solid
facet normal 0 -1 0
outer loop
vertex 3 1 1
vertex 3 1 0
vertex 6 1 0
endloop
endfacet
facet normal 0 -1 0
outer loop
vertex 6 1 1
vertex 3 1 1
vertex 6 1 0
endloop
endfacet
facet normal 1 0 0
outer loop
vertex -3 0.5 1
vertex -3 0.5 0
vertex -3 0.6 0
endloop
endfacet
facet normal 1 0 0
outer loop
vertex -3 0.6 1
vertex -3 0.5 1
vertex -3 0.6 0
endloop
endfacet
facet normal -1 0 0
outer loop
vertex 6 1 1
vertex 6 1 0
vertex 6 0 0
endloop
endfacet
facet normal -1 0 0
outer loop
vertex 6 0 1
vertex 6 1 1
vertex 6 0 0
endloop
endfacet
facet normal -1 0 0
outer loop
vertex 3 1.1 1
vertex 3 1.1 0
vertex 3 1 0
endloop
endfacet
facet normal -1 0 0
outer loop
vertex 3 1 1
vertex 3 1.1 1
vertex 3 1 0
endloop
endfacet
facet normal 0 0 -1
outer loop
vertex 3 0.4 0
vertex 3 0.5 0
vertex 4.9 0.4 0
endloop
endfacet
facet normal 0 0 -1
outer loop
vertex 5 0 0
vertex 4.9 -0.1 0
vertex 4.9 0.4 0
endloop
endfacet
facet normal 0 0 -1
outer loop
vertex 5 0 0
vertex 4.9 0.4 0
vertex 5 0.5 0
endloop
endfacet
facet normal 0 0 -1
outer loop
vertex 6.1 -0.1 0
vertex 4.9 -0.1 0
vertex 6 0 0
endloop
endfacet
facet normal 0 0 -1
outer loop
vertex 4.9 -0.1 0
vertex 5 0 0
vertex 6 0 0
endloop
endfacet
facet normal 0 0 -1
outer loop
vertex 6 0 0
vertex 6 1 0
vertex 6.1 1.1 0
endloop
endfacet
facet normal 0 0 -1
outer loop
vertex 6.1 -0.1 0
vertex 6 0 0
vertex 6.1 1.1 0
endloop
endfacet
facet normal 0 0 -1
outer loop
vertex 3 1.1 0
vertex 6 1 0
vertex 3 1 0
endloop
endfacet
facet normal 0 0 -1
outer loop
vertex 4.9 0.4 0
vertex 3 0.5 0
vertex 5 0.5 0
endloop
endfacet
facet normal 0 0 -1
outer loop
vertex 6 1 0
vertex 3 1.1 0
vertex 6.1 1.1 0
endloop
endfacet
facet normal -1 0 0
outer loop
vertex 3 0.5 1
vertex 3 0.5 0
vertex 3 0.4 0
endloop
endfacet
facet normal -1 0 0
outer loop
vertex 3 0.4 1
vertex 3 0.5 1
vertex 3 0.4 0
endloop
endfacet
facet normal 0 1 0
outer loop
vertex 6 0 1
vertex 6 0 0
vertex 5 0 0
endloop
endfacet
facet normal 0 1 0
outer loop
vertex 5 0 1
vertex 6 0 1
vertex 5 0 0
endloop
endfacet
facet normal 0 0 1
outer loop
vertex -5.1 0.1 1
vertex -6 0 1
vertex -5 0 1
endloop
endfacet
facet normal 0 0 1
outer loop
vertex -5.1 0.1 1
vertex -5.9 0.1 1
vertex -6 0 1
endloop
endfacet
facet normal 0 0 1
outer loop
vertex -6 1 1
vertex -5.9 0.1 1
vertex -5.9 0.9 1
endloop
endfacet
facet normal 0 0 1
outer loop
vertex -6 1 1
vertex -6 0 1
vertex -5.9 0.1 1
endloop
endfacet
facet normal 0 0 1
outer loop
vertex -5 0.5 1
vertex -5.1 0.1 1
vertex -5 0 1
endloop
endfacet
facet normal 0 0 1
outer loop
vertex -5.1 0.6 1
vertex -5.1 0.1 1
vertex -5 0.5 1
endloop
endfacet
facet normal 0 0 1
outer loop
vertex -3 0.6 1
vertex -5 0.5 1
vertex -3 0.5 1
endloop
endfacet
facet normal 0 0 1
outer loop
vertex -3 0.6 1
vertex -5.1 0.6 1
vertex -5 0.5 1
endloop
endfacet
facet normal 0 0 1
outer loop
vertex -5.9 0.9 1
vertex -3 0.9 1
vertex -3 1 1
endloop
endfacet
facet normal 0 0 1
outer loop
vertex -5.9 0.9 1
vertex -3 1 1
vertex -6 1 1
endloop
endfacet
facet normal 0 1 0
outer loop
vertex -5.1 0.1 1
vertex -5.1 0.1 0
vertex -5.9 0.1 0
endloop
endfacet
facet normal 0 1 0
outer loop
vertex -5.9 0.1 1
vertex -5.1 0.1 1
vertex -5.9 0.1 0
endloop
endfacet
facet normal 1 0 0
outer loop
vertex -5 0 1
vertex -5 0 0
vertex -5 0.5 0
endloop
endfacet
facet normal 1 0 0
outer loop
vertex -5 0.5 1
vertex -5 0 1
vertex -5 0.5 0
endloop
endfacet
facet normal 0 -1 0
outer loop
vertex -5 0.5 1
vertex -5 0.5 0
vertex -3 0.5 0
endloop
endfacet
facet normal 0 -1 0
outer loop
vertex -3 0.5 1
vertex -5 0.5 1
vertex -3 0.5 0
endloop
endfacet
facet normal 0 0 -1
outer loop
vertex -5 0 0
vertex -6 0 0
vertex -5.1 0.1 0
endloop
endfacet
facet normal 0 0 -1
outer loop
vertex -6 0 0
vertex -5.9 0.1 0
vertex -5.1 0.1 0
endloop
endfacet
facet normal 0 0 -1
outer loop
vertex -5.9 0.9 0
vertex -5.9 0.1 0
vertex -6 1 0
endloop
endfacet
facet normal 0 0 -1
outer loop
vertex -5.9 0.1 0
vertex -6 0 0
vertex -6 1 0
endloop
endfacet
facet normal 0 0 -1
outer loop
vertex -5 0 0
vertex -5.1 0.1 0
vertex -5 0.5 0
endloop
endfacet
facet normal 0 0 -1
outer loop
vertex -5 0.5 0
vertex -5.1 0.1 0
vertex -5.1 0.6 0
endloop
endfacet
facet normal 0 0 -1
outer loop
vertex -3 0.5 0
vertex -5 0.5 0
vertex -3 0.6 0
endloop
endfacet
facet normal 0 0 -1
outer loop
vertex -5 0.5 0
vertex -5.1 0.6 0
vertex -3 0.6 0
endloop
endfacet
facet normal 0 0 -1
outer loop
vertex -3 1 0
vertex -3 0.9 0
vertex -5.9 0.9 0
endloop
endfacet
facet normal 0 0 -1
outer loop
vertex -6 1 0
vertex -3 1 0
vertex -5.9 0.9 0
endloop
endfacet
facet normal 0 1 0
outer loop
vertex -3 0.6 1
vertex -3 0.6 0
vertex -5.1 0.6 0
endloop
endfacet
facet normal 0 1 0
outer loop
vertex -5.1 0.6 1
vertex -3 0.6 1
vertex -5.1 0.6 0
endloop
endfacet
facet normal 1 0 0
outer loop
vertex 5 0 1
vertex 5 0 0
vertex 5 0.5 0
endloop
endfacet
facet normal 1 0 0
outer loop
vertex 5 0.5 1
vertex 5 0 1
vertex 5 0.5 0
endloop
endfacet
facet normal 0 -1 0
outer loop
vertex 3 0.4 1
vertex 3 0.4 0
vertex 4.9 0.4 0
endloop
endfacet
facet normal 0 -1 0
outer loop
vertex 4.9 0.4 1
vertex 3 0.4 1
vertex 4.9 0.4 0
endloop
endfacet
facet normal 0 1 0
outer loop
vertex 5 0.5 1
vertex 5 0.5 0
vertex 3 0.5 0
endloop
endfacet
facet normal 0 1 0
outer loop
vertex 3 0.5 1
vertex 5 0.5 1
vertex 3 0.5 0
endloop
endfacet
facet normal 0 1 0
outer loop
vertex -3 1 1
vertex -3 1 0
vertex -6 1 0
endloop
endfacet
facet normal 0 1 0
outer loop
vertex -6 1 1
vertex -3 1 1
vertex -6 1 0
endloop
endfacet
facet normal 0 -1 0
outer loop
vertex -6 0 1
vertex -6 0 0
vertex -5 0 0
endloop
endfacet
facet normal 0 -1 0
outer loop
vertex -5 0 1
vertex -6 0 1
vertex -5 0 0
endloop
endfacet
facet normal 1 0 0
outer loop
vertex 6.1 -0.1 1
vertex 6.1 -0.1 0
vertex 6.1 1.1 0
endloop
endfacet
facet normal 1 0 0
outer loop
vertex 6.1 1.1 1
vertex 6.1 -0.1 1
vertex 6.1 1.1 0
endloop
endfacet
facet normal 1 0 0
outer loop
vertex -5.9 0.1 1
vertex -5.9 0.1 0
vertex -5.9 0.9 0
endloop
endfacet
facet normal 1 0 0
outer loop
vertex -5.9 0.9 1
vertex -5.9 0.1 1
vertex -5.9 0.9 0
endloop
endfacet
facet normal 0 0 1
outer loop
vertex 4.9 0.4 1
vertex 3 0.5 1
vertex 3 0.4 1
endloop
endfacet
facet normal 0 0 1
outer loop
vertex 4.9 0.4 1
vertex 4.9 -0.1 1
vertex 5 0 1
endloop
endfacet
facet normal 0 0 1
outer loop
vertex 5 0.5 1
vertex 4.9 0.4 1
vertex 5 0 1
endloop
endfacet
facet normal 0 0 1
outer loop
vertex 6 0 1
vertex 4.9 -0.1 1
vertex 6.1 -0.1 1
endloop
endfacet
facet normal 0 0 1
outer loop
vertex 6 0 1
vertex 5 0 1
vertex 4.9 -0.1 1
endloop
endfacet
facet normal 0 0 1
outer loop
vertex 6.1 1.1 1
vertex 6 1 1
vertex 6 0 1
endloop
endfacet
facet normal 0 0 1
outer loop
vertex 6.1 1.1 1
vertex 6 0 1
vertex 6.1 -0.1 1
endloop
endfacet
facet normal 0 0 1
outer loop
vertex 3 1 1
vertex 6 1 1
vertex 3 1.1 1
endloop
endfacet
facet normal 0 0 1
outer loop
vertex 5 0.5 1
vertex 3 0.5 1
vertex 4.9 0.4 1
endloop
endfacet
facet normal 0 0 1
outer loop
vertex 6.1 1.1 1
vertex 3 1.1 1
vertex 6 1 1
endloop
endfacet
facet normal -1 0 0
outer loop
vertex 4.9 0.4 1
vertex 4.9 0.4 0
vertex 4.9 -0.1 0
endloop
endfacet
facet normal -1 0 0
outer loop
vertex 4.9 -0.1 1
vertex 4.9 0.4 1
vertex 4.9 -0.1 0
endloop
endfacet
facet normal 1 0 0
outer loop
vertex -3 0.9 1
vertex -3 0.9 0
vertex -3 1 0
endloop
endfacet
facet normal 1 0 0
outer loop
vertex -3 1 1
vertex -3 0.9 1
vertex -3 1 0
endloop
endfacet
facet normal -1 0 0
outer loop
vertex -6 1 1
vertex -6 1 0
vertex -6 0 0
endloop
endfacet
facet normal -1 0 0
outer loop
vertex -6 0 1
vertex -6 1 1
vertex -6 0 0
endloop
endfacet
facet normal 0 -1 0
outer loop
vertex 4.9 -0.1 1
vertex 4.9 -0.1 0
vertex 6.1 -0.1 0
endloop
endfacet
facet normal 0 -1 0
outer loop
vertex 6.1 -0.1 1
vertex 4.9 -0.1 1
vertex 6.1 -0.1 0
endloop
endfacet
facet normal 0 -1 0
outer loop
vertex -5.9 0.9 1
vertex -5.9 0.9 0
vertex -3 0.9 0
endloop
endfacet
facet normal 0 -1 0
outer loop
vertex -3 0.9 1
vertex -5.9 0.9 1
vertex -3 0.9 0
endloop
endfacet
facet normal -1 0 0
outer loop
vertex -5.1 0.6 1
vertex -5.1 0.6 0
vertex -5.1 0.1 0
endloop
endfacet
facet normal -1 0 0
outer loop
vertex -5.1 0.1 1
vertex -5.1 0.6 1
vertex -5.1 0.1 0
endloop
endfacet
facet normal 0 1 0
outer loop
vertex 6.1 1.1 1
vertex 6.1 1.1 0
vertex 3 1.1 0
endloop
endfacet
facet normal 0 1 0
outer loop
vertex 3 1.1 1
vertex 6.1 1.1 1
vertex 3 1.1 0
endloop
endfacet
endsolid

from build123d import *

# Parameters (mm, degrees)
EXTRUDE_THIN2_DEPTH   = 1
EXTRUDE_THIN2_2_DEPTH = 1


with BuildPart() as part:
    # Sketch2 → Extrude-Thin2 (new body)
    with BuildSketch(Plane.XY):
        Polygon((-3, 1), (-6, 1), (-6, 0), (-5, 0), (-5, 0.5), (-3, 0.5), (-3, 0.6), (-5.1, 0.6), (-5.1, 0.1), (-5.9, 0.1), (-5.9, 0.9), (-3, 0.9), align=None)
    extrude(amount=EXTRUDE_THIN2_DEPTH)


with BuildPart() as body_2:
    # Sketch2 → Extrude-Thin2 2 (new body)
    with BuildSketch(Plane.XY):
        Polygon((3, 1), (6, 1), (6, 0), (5, 0), (5, 0.5), (3, 0.5), (3, 0.4), (4.9, 0.4), (4.9, -0.1), (6.1, -0.1), (6.1, 1.1), (3, 1.1), align=None)
    extrude(amount=EXTRUDE_THIN2_2_DEPTH)


solid = Compound([part.part, body_2.part])
